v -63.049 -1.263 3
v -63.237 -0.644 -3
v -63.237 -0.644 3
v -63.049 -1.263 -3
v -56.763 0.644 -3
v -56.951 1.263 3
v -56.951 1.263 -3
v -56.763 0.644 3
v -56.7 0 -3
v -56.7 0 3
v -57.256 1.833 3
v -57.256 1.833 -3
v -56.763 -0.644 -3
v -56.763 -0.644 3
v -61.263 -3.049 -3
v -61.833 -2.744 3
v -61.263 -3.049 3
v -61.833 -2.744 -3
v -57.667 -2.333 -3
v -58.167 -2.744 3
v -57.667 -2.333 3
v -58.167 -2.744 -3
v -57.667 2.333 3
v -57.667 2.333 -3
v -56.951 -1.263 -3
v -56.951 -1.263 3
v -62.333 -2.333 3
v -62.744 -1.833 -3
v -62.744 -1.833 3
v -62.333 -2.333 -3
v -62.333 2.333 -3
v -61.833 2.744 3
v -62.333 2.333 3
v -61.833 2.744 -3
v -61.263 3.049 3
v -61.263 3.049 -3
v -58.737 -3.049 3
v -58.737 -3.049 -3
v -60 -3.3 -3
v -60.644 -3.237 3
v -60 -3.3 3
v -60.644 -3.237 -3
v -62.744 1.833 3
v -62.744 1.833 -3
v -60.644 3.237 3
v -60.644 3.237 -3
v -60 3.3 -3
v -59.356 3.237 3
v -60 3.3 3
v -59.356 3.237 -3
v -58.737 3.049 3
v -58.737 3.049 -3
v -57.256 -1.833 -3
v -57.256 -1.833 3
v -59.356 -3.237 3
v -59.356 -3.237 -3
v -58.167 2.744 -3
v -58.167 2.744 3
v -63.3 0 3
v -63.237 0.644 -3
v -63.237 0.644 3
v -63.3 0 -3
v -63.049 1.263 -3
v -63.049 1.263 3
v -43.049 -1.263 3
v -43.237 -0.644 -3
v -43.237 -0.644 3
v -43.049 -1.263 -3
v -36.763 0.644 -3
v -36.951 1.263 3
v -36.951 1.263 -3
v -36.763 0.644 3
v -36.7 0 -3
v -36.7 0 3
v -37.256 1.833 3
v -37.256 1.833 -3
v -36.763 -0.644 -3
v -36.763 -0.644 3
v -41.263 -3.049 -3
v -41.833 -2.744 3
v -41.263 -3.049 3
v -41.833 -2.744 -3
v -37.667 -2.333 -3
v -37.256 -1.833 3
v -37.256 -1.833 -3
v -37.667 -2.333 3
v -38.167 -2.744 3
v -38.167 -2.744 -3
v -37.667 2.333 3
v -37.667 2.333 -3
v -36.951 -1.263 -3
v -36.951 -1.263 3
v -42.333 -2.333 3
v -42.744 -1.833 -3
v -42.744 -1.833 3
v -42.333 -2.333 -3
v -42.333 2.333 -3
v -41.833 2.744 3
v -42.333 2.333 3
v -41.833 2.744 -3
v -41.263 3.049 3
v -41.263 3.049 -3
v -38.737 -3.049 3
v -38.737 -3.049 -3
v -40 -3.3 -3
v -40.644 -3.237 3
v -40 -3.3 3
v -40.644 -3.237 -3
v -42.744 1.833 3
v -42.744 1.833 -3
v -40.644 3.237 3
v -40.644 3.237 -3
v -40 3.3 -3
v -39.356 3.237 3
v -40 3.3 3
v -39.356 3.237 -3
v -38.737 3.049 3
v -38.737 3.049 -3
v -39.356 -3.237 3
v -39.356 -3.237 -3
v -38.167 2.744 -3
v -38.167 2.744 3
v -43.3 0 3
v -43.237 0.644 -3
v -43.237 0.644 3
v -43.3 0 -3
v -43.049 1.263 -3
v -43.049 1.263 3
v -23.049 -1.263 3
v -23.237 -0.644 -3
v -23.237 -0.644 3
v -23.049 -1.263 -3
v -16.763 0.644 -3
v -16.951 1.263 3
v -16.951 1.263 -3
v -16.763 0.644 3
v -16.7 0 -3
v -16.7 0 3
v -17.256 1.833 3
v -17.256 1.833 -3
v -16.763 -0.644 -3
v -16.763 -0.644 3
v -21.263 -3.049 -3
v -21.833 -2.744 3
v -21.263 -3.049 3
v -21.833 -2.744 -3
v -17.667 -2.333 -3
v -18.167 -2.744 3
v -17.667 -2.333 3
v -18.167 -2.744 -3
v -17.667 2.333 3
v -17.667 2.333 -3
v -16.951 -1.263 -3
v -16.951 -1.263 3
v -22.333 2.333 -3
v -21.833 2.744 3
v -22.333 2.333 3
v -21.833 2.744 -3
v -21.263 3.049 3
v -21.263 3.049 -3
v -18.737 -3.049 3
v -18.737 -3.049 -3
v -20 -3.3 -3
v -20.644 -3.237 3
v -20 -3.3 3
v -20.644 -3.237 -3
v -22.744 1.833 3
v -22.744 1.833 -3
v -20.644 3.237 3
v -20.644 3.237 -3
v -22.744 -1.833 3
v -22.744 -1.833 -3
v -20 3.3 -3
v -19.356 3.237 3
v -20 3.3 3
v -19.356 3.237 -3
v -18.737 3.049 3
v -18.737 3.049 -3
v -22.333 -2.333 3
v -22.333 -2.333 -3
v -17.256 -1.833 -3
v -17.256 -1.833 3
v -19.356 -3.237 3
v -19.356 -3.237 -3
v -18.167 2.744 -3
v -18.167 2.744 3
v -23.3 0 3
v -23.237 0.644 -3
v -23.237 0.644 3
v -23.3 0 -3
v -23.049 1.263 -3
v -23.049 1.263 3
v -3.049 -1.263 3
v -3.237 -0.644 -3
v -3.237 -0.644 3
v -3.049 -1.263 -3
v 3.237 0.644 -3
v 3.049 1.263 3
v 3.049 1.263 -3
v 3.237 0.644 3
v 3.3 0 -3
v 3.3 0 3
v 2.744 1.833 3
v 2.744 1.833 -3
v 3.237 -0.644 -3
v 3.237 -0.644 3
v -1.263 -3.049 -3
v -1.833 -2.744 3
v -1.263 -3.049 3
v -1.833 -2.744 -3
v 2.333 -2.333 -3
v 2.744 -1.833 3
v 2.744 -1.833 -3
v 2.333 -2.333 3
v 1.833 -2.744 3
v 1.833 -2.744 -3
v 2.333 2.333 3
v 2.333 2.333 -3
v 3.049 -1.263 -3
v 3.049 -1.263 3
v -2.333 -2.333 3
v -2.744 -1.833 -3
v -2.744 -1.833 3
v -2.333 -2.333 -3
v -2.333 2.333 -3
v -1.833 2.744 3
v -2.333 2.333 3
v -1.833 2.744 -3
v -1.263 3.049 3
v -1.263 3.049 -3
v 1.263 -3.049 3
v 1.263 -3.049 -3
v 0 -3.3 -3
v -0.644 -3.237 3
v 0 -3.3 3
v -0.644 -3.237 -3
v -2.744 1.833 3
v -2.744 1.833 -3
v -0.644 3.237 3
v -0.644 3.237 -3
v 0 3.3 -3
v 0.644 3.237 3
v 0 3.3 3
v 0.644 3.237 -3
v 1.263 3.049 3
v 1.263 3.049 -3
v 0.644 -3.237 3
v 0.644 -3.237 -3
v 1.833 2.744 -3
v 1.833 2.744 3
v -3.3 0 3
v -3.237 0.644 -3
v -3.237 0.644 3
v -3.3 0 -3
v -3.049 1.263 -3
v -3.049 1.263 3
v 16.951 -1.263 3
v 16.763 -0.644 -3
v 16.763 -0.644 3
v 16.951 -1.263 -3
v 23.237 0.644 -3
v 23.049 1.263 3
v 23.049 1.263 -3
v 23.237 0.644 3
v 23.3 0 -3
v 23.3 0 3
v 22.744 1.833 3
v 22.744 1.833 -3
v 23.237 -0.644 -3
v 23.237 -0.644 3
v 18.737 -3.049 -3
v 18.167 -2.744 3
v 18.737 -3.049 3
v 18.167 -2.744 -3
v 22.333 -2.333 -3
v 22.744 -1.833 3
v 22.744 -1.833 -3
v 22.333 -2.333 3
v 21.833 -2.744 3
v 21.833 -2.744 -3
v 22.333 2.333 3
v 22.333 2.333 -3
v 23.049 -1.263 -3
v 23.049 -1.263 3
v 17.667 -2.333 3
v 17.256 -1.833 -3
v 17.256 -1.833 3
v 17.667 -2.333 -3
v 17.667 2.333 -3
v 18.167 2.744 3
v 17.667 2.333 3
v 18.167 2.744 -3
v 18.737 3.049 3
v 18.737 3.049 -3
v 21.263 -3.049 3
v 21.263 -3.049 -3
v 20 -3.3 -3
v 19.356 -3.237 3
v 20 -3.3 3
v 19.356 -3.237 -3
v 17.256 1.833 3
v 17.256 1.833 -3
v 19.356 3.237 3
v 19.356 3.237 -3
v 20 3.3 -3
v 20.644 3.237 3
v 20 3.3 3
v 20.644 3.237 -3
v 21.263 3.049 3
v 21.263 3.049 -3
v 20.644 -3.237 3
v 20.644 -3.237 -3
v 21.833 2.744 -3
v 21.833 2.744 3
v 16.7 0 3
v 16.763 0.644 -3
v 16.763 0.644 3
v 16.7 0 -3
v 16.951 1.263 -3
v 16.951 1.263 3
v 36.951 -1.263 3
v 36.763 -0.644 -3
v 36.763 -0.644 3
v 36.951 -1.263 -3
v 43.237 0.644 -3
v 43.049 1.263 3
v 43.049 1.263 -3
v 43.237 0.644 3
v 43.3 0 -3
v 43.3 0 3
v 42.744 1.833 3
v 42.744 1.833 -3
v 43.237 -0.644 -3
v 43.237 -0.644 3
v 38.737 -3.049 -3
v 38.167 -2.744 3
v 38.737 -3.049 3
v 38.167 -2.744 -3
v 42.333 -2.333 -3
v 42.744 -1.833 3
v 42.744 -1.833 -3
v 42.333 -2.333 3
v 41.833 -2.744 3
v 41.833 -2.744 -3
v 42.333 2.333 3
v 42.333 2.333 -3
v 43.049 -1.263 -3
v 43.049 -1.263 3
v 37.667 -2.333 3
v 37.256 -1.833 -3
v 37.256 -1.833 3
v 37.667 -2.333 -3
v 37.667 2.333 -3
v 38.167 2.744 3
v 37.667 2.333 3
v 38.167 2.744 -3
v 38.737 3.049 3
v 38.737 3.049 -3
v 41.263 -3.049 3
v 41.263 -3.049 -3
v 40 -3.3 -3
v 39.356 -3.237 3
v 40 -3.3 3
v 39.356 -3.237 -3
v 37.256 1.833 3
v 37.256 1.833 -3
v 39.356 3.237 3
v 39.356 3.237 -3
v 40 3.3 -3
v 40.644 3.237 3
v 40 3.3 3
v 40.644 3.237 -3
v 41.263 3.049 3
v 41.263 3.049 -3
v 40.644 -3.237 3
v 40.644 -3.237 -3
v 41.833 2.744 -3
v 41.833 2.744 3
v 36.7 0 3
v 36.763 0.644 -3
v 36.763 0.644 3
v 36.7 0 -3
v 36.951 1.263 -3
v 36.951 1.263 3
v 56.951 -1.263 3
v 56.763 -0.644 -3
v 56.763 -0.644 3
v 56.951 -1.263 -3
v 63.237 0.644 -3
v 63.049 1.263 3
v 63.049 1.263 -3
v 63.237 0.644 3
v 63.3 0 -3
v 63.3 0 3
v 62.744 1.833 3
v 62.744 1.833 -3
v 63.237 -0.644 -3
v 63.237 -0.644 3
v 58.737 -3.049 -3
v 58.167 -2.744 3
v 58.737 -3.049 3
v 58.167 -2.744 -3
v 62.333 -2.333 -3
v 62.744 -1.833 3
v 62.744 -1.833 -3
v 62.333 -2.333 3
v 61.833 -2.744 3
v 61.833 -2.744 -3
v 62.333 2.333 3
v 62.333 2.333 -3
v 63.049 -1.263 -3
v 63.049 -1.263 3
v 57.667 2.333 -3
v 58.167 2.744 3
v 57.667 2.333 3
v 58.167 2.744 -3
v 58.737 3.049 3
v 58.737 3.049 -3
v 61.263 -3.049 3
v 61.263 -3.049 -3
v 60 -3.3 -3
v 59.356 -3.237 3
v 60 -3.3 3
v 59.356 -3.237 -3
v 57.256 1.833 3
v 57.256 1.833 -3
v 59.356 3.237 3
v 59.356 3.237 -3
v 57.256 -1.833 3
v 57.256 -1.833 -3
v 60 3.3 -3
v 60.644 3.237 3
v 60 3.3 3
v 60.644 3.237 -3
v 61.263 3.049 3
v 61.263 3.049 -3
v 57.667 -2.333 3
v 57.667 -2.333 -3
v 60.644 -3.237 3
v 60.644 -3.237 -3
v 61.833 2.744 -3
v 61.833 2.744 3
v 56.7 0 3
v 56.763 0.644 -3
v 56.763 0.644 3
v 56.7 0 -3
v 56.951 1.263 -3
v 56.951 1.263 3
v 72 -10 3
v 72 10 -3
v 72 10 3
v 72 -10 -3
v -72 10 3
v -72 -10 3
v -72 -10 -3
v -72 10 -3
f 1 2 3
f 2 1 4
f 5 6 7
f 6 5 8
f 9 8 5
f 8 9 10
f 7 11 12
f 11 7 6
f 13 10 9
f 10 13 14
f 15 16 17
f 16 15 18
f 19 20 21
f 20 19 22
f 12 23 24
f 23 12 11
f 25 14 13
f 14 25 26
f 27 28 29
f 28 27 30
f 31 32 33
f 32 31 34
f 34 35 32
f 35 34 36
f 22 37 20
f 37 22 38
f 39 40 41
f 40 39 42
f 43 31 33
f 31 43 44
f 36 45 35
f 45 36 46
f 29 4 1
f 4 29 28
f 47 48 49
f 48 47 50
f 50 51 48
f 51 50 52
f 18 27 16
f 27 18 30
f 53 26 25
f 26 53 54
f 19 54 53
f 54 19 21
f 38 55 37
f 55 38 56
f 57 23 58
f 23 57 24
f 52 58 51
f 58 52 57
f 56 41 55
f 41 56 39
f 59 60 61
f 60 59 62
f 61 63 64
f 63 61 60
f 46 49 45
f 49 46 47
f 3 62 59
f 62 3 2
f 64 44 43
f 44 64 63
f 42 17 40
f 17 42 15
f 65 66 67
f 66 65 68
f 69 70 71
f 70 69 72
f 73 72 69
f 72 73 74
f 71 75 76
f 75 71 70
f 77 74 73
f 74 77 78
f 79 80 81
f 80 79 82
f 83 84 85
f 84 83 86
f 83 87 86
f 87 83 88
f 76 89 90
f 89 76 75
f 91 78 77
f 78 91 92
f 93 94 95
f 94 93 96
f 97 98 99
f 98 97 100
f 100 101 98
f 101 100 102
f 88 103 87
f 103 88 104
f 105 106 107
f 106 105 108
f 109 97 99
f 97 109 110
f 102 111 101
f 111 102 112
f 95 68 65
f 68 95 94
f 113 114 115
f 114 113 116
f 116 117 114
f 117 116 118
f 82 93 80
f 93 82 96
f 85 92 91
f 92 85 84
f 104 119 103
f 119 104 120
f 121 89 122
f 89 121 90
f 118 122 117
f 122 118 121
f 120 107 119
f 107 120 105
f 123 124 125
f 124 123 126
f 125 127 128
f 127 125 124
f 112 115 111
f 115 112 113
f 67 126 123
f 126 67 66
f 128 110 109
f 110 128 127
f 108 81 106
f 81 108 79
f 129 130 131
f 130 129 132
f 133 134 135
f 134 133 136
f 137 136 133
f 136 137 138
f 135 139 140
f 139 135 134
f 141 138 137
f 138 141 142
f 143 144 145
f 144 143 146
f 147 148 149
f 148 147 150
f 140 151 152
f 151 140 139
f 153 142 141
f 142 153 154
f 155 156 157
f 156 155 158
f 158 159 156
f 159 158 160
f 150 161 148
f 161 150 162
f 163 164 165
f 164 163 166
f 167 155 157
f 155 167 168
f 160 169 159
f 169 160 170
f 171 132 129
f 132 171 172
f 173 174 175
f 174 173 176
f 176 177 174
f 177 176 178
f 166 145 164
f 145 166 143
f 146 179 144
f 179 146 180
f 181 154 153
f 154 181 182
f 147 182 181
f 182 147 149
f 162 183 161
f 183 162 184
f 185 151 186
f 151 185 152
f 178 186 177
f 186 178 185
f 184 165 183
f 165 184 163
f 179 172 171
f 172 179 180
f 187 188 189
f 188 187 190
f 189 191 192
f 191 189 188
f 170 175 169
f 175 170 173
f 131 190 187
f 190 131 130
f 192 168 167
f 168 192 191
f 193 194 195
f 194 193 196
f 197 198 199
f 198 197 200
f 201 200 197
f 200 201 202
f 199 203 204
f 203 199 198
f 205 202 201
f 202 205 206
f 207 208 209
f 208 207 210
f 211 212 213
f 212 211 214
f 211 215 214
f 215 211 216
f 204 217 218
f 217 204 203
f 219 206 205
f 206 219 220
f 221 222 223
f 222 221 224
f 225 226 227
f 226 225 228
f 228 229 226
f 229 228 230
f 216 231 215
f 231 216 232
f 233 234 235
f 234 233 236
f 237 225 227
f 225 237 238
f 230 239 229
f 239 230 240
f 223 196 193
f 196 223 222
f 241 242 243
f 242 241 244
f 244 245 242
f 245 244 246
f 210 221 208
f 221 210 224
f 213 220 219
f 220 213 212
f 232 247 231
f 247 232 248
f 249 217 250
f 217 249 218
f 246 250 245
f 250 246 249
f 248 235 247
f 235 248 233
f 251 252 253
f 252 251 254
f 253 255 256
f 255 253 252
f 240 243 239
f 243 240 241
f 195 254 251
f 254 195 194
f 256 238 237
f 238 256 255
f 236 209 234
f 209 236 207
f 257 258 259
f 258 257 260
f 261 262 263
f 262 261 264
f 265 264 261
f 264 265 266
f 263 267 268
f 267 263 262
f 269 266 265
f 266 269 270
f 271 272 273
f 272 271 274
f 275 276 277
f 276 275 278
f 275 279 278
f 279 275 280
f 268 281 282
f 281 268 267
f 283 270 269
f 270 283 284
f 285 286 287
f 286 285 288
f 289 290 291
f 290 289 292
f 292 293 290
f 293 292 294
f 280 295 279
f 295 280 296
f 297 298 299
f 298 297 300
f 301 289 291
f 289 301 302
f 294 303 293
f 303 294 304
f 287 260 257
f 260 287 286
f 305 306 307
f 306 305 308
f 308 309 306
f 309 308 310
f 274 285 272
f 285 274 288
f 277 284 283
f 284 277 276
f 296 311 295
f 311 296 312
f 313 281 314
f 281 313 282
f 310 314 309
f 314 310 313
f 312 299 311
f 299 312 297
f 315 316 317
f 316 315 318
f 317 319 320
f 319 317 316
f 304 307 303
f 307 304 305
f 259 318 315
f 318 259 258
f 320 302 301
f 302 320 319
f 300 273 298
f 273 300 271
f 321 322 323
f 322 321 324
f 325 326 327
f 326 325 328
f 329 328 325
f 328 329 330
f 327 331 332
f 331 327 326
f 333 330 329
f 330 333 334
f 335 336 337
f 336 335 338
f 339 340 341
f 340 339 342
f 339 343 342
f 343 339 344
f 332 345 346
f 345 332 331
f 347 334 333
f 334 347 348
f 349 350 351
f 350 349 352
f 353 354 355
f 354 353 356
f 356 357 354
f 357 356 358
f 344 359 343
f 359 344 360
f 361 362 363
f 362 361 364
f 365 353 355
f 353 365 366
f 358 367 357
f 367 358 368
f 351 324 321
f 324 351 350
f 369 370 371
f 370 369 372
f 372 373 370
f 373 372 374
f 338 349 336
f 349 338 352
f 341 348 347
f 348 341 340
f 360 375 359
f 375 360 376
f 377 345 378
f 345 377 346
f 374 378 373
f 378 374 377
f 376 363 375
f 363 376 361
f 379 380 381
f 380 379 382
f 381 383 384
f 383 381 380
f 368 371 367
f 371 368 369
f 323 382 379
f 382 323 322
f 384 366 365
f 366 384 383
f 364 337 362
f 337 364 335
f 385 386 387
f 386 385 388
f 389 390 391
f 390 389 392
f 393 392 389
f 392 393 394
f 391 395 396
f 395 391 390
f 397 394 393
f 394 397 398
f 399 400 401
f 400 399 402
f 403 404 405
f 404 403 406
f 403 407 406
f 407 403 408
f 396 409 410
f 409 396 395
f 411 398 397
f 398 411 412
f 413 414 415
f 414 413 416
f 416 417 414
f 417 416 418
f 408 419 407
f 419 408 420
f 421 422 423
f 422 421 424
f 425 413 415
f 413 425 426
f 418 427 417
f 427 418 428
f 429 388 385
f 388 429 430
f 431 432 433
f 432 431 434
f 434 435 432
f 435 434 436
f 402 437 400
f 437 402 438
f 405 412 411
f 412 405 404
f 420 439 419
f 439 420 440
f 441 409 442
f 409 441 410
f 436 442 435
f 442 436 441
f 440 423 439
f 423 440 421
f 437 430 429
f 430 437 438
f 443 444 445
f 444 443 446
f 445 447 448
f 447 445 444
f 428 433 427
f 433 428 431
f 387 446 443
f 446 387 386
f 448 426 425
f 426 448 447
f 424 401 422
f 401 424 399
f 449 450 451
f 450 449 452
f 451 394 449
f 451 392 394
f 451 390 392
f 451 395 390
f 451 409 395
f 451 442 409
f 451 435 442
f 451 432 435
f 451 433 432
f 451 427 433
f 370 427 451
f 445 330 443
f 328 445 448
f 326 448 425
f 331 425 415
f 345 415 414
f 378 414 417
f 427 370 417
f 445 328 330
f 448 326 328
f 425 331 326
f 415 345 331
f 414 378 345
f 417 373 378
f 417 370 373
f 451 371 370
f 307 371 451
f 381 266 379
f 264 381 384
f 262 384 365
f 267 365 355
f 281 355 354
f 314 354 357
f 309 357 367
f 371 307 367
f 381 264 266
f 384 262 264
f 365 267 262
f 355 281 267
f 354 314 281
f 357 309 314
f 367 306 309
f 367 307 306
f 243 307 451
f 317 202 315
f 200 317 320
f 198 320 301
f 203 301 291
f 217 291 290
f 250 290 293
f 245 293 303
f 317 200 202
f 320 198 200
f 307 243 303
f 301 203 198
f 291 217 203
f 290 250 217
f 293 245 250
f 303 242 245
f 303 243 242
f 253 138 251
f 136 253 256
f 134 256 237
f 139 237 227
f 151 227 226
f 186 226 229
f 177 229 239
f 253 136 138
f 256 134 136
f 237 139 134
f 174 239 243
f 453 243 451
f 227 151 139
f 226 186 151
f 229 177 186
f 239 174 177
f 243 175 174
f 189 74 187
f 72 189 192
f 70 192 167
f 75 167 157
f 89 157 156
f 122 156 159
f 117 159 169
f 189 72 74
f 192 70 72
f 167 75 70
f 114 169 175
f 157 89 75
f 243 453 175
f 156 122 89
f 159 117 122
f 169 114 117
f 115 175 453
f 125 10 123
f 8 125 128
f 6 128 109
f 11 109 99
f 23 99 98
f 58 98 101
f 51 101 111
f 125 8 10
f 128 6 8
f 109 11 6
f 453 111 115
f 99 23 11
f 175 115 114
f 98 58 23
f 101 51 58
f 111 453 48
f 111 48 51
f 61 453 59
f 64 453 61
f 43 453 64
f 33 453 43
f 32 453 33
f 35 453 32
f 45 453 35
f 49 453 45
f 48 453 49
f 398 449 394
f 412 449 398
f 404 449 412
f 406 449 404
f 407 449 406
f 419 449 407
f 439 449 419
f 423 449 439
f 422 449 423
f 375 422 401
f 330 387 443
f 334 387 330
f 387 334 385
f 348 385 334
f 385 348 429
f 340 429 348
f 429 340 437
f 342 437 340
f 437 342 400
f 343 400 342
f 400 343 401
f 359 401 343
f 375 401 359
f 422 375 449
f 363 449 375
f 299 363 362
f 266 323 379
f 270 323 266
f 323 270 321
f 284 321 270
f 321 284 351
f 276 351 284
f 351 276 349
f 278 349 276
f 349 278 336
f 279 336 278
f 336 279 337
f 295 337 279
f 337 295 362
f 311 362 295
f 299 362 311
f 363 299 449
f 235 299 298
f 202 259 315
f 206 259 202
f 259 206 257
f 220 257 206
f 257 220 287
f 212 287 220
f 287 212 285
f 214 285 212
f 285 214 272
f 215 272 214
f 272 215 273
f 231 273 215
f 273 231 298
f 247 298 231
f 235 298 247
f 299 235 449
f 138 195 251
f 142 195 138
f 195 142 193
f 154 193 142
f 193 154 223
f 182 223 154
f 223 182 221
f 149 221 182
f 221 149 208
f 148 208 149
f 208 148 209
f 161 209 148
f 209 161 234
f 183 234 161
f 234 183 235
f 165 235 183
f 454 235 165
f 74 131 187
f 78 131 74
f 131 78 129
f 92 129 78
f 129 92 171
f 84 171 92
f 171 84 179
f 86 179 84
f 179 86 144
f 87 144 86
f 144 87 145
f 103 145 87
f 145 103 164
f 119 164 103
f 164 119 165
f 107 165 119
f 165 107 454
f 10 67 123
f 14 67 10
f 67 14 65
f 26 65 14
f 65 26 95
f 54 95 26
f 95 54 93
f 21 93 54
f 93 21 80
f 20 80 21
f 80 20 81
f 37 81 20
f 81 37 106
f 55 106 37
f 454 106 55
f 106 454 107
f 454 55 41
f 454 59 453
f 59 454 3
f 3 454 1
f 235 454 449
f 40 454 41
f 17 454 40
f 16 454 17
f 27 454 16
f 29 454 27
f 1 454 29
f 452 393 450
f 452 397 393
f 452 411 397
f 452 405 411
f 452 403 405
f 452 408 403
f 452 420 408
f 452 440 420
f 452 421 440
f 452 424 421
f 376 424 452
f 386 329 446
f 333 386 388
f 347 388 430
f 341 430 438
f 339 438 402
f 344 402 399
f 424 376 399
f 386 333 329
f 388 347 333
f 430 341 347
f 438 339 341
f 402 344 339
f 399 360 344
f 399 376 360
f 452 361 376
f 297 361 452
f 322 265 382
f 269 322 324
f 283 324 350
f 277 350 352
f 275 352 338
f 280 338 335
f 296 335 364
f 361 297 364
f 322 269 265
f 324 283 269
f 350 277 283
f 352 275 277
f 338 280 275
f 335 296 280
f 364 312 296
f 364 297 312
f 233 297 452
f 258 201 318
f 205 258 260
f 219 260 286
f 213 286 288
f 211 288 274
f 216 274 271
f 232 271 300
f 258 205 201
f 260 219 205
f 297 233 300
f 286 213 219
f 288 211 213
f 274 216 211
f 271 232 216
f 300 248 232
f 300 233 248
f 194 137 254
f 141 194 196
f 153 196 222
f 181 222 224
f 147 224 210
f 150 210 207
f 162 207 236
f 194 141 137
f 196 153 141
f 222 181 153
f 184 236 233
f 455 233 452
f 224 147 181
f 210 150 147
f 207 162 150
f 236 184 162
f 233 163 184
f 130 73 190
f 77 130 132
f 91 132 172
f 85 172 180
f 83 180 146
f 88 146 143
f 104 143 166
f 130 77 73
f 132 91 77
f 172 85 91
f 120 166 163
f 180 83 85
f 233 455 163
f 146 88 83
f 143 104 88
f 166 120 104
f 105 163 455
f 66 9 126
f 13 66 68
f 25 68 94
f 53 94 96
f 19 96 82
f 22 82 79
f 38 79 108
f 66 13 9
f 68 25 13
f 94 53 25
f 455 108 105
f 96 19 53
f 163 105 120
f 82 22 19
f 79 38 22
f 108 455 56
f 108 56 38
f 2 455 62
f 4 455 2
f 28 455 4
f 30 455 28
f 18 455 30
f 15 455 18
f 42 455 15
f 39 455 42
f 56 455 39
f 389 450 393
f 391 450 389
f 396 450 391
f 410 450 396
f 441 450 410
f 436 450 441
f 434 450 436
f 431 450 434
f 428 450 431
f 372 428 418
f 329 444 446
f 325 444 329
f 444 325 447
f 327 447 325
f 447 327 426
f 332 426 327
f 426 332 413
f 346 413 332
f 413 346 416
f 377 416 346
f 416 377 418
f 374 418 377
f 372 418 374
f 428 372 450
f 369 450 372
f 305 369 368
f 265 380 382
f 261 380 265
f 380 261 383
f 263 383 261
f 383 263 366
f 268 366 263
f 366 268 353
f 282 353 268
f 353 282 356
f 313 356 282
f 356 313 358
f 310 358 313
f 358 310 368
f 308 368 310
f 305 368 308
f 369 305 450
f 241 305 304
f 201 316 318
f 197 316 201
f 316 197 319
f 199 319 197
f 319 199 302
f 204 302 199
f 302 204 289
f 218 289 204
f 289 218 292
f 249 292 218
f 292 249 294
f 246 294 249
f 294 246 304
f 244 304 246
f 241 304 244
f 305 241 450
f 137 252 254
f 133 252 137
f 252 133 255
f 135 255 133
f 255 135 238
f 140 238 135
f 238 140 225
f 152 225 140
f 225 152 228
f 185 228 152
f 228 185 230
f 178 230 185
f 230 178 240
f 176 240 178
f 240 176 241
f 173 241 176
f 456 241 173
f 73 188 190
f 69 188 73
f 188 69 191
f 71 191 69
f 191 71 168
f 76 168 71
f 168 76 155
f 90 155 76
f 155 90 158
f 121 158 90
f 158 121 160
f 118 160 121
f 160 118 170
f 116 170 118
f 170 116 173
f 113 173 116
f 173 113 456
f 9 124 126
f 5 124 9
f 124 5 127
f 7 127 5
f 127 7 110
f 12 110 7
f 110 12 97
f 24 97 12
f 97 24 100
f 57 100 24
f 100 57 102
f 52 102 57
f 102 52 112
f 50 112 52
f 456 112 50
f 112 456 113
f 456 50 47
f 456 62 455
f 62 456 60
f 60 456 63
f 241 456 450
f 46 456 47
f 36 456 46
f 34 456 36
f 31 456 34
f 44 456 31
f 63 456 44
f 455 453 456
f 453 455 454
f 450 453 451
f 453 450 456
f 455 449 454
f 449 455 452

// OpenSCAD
$fn = 32;

// ----------------------------------------------------------------------
// Hole bar, 7 x Ø6.6
// skip layout, 12 mm edge offset
// ----------------------------------------------------------------------

// --- parameters (mm) ---
bar_w = 20;       // bar width (Y)
seat_tol = 0.15;  // tolerance at the seating features
free_tol = 0.5;   // general tolerance on the free sizes
bar_t = 6;        // bar thickness (Z)
holes = 7;        // holes per row
hole_d = 6.6;     // hole diameter
edge = 12;        // offset from the bar end to the first hole
grid_pitch = 10;  // grid the bar was laid out on

// --- derived feature positions (mm) ---
pitch = grid_pitch * 2;       // = 20   holes sit every other grid slot
span = (holes - 1) * pitch;   // = 120   distance between the end holes
bar_l = span + 2 * edge;      // = 144   overall bar length
start_x = -bar_l / 2 + edge;  // = -60   X of the first hole
feature_centers = [
  [start_x + 0 * pitch, 0],
  [start_x + 1 * pitch, 0],
  [start_x + 2 * pitch, 0],
  [start_x + 3 * pitch, 0],
  [start_x + 4 * pitch, 0],
  [start_x + 5 * pitch, 0],
  [start_x + 6 * pitch, 0]
];   // hole centres of the first row

// bar with one row of holes, drilled from feature_centers
difference() {
  translate([-bar_l / 2, -bar_w / 2, -bar_t / 2]) cube([bar_l, bar_w, bar_t]);
  for (centre = feature_centers)
    translate([centre[0], centre[1], 0])
      cylinder(d = hole_d, h = bar_t + 2, center = true);
}
